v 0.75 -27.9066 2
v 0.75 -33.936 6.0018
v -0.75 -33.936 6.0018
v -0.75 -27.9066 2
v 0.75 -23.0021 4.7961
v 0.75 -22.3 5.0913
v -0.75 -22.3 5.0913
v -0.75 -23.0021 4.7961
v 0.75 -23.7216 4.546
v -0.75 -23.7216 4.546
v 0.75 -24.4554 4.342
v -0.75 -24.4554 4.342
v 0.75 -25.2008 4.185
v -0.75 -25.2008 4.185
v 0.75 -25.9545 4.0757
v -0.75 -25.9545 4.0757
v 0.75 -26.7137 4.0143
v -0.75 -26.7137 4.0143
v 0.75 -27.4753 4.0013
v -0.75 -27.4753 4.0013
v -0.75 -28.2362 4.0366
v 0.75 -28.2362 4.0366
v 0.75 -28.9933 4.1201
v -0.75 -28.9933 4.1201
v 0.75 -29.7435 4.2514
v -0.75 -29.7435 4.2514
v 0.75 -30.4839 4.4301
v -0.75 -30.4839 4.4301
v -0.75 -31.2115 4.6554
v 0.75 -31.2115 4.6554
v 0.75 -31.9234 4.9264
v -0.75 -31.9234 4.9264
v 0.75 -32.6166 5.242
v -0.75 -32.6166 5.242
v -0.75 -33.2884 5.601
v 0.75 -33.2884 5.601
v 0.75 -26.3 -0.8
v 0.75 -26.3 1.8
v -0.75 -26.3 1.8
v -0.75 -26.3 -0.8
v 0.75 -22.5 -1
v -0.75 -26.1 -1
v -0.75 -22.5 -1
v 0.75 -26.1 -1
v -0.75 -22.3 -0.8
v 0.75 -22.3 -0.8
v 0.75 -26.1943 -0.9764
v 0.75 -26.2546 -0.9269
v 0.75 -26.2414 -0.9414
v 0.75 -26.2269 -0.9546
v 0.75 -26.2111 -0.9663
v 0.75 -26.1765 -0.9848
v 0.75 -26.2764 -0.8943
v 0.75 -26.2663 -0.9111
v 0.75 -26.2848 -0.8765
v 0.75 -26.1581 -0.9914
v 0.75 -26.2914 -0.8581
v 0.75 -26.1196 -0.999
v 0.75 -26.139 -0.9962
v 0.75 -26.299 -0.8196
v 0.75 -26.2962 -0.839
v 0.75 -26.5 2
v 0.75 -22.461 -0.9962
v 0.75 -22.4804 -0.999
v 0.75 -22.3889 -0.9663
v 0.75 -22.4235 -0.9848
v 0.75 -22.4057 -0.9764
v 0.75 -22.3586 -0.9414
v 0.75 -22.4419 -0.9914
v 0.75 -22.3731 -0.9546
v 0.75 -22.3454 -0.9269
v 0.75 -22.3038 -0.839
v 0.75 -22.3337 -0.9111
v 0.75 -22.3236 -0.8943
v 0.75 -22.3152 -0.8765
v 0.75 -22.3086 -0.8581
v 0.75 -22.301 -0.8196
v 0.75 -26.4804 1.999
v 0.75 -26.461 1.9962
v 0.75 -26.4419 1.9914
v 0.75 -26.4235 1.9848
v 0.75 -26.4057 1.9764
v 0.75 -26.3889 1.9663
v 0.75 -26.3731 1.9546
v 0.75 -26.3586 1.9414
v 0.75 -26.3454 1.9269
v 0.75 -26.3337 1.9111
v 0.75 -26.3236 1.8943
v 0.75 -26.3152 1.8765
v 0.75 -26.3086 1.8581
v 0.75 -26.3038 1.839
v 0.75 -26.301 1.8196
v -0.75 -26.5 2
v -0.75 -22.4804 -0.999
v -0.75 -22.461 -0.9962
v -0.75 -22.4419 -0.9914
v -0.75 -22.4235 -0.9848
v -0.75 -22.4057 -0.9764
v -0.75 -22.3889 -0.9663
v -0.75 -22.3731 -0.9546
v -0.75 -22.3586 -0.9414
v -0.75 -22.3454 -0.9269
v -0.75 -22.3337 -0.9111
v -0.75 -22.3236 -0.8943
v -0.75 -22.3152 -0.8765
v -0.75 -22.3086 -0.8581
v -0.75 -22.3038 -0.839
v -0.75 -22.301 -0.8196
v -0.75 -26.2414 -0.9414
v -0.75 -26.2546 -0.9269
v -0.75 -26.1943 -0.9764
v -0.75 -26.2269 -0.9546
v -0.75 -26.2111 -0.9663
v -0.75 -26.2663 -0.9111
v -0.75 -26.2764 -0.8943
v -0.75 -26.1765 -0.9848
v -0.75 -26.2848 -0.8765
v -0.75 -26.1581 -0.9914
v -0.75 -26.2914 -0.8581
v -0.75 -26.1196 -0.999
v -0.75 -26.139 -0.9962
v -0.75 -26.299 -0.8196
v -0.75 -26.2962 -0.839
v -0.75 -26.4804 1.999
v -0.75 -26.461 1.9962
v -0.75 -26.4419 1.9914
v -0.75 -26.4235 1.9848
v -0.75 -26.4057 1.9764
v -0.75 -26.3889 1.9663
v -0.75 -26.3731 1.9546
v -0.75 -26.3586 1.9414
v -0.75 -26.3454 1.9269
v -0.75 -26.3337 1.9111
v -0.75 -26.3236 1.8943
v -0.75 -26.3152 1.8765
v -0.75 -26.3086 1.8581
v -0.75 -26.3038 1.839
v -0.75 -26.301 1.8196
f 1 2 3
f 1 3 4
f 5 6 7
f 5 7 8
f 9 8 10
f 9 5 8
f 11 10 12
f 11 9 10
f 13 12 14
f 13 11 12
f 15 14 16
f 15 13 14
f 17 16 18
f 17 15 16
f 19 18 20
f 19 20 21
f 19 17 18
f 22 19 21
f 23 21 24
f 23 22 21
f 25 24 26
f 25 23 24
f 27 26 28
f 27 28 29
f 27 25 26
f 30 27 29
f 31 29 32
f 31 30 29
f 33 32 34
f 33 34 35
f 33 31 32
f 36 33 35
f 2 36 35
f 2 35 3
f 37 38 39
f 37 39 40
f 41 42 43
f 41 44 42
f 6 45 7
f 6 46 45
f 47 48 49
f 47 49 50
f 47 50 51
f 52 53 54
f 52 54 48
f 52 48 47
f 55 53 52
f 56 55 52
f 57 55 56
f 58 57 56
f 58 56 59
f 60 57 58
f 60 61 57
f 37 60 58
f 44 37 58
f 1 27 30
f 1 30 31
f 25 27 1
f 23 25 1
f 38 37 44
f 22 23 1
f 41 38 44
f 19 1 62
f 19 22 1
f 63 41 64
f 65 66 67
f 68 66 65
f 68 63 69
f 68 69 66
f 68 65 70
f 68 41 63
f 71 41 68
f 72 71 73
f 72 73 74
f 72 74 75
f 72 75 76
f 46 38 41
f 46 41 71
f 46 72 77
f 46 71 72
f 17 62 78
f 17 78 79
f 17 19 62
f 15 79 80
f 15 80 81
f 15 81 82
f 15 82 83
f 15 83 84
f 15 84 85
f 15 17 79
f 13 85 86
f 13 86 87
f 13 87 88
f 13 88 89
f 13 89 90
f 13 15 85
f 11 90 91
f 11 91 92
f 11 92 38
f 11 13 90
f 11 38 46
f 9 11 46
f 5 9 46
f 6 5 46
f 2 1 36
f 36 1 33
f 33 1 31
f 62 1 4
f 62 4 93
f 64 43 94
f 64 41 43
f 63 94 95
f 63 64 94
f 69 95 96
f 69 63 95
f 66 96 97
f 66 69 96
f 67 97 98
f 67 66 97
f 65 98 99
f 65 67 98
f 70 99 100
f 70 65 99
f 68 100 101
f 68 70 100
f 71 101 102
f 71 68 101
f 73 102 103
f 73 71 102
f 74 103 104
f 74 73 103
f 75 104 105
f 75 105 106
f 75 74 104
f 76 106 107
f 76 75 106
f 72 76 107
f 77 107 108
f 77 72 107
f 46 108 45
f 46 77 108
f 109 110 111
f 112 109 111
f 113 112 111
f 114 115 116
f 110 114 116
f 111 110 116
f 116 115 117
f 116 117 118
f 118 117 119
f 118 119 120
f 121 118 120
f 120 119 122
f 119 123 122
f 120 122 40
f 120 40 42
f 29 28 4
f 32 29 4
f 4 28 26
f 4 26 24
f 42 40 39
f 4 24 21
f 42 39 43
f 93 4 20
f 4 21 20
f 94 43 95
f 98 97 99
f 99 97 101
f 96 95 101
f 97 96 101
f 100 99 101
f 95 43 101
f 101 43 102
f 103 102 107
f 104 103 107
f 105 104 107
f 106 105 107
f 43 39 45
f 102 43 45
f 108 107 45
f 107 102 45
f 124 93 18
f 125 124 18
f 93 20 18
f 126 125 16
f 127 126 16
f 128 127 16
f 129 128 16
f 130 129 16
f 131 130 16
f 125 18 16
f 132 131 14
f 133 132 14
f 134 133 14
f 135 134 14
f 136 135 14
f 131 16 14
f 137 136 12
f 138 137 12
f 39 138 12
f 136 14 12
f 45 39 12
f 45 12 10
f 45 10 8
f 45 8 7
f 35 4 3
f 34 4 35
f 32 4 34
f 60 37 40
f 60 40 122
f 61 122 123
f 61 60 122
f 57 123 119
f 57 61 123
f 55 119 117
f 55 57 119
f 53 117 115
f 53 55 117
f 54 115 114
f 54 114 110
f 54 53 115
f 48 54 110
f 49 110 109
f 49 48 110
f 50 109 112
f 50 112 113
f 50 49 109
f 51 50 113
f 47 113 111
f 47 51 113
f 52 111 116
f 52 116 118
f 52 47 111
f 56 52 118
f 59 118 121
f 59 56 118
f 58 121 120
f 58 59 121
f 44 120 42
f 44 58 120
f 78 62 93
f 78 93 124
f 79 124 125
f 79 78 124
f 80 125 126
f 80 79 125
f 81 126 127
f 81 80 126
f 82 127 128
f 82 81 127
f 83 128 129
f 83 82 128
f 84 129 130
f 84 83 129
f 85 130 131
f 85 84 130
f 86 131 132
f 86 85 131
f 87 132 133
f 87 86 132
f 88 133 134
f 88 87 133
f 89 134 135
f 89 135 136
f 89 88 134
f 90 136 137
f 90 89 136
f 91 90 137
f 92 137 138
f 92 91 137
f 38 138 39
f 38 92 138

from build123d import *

# Parameters (mm, degrees)
F1_DEPTH = 0.75


# Not quite as in the source:
# - a feature names something its author has since deleted; it is built from what else it names


with BuildPart() as f1:
    # F0 (on Right) → F1 (new body, symmetric)
    with BuildSketch(Plane.YZ):
        with BuildLine():
            Line((-22.3, -0.8), (-22.3, 5.0912878854))
            ThreePointArc((-22.3, 5.0912878854), (-28.2361690228, 4.0365729174), (-33.9360169573, 6.0018362214))
            Line((-33.9360169573, 6.0018362214), (-27.9066450894, 2))
            Line((-27.9066450894, 2), (-26.5, 2))
            ThreePointArc((-26.5, 2), (-26.3585786438, 1.9414213562), (-26.3, 1.8))
            Line((-26.3, 1.8), (-26.3, -0.8))
            ThreePointArc((-26.3, -0.8), (-26.2414213562, -0.9414213562), (-26.1, -1))
            Line((-26.1, -1), (-22.5, -1))
            ThreePointArc((-22.5, -1), (-22.3585786438, -0.9414213562), (-22.3, -0.8))
        make_face()
    extrude(amount=F1_DEPTH, both=True)


solid = f1.part
